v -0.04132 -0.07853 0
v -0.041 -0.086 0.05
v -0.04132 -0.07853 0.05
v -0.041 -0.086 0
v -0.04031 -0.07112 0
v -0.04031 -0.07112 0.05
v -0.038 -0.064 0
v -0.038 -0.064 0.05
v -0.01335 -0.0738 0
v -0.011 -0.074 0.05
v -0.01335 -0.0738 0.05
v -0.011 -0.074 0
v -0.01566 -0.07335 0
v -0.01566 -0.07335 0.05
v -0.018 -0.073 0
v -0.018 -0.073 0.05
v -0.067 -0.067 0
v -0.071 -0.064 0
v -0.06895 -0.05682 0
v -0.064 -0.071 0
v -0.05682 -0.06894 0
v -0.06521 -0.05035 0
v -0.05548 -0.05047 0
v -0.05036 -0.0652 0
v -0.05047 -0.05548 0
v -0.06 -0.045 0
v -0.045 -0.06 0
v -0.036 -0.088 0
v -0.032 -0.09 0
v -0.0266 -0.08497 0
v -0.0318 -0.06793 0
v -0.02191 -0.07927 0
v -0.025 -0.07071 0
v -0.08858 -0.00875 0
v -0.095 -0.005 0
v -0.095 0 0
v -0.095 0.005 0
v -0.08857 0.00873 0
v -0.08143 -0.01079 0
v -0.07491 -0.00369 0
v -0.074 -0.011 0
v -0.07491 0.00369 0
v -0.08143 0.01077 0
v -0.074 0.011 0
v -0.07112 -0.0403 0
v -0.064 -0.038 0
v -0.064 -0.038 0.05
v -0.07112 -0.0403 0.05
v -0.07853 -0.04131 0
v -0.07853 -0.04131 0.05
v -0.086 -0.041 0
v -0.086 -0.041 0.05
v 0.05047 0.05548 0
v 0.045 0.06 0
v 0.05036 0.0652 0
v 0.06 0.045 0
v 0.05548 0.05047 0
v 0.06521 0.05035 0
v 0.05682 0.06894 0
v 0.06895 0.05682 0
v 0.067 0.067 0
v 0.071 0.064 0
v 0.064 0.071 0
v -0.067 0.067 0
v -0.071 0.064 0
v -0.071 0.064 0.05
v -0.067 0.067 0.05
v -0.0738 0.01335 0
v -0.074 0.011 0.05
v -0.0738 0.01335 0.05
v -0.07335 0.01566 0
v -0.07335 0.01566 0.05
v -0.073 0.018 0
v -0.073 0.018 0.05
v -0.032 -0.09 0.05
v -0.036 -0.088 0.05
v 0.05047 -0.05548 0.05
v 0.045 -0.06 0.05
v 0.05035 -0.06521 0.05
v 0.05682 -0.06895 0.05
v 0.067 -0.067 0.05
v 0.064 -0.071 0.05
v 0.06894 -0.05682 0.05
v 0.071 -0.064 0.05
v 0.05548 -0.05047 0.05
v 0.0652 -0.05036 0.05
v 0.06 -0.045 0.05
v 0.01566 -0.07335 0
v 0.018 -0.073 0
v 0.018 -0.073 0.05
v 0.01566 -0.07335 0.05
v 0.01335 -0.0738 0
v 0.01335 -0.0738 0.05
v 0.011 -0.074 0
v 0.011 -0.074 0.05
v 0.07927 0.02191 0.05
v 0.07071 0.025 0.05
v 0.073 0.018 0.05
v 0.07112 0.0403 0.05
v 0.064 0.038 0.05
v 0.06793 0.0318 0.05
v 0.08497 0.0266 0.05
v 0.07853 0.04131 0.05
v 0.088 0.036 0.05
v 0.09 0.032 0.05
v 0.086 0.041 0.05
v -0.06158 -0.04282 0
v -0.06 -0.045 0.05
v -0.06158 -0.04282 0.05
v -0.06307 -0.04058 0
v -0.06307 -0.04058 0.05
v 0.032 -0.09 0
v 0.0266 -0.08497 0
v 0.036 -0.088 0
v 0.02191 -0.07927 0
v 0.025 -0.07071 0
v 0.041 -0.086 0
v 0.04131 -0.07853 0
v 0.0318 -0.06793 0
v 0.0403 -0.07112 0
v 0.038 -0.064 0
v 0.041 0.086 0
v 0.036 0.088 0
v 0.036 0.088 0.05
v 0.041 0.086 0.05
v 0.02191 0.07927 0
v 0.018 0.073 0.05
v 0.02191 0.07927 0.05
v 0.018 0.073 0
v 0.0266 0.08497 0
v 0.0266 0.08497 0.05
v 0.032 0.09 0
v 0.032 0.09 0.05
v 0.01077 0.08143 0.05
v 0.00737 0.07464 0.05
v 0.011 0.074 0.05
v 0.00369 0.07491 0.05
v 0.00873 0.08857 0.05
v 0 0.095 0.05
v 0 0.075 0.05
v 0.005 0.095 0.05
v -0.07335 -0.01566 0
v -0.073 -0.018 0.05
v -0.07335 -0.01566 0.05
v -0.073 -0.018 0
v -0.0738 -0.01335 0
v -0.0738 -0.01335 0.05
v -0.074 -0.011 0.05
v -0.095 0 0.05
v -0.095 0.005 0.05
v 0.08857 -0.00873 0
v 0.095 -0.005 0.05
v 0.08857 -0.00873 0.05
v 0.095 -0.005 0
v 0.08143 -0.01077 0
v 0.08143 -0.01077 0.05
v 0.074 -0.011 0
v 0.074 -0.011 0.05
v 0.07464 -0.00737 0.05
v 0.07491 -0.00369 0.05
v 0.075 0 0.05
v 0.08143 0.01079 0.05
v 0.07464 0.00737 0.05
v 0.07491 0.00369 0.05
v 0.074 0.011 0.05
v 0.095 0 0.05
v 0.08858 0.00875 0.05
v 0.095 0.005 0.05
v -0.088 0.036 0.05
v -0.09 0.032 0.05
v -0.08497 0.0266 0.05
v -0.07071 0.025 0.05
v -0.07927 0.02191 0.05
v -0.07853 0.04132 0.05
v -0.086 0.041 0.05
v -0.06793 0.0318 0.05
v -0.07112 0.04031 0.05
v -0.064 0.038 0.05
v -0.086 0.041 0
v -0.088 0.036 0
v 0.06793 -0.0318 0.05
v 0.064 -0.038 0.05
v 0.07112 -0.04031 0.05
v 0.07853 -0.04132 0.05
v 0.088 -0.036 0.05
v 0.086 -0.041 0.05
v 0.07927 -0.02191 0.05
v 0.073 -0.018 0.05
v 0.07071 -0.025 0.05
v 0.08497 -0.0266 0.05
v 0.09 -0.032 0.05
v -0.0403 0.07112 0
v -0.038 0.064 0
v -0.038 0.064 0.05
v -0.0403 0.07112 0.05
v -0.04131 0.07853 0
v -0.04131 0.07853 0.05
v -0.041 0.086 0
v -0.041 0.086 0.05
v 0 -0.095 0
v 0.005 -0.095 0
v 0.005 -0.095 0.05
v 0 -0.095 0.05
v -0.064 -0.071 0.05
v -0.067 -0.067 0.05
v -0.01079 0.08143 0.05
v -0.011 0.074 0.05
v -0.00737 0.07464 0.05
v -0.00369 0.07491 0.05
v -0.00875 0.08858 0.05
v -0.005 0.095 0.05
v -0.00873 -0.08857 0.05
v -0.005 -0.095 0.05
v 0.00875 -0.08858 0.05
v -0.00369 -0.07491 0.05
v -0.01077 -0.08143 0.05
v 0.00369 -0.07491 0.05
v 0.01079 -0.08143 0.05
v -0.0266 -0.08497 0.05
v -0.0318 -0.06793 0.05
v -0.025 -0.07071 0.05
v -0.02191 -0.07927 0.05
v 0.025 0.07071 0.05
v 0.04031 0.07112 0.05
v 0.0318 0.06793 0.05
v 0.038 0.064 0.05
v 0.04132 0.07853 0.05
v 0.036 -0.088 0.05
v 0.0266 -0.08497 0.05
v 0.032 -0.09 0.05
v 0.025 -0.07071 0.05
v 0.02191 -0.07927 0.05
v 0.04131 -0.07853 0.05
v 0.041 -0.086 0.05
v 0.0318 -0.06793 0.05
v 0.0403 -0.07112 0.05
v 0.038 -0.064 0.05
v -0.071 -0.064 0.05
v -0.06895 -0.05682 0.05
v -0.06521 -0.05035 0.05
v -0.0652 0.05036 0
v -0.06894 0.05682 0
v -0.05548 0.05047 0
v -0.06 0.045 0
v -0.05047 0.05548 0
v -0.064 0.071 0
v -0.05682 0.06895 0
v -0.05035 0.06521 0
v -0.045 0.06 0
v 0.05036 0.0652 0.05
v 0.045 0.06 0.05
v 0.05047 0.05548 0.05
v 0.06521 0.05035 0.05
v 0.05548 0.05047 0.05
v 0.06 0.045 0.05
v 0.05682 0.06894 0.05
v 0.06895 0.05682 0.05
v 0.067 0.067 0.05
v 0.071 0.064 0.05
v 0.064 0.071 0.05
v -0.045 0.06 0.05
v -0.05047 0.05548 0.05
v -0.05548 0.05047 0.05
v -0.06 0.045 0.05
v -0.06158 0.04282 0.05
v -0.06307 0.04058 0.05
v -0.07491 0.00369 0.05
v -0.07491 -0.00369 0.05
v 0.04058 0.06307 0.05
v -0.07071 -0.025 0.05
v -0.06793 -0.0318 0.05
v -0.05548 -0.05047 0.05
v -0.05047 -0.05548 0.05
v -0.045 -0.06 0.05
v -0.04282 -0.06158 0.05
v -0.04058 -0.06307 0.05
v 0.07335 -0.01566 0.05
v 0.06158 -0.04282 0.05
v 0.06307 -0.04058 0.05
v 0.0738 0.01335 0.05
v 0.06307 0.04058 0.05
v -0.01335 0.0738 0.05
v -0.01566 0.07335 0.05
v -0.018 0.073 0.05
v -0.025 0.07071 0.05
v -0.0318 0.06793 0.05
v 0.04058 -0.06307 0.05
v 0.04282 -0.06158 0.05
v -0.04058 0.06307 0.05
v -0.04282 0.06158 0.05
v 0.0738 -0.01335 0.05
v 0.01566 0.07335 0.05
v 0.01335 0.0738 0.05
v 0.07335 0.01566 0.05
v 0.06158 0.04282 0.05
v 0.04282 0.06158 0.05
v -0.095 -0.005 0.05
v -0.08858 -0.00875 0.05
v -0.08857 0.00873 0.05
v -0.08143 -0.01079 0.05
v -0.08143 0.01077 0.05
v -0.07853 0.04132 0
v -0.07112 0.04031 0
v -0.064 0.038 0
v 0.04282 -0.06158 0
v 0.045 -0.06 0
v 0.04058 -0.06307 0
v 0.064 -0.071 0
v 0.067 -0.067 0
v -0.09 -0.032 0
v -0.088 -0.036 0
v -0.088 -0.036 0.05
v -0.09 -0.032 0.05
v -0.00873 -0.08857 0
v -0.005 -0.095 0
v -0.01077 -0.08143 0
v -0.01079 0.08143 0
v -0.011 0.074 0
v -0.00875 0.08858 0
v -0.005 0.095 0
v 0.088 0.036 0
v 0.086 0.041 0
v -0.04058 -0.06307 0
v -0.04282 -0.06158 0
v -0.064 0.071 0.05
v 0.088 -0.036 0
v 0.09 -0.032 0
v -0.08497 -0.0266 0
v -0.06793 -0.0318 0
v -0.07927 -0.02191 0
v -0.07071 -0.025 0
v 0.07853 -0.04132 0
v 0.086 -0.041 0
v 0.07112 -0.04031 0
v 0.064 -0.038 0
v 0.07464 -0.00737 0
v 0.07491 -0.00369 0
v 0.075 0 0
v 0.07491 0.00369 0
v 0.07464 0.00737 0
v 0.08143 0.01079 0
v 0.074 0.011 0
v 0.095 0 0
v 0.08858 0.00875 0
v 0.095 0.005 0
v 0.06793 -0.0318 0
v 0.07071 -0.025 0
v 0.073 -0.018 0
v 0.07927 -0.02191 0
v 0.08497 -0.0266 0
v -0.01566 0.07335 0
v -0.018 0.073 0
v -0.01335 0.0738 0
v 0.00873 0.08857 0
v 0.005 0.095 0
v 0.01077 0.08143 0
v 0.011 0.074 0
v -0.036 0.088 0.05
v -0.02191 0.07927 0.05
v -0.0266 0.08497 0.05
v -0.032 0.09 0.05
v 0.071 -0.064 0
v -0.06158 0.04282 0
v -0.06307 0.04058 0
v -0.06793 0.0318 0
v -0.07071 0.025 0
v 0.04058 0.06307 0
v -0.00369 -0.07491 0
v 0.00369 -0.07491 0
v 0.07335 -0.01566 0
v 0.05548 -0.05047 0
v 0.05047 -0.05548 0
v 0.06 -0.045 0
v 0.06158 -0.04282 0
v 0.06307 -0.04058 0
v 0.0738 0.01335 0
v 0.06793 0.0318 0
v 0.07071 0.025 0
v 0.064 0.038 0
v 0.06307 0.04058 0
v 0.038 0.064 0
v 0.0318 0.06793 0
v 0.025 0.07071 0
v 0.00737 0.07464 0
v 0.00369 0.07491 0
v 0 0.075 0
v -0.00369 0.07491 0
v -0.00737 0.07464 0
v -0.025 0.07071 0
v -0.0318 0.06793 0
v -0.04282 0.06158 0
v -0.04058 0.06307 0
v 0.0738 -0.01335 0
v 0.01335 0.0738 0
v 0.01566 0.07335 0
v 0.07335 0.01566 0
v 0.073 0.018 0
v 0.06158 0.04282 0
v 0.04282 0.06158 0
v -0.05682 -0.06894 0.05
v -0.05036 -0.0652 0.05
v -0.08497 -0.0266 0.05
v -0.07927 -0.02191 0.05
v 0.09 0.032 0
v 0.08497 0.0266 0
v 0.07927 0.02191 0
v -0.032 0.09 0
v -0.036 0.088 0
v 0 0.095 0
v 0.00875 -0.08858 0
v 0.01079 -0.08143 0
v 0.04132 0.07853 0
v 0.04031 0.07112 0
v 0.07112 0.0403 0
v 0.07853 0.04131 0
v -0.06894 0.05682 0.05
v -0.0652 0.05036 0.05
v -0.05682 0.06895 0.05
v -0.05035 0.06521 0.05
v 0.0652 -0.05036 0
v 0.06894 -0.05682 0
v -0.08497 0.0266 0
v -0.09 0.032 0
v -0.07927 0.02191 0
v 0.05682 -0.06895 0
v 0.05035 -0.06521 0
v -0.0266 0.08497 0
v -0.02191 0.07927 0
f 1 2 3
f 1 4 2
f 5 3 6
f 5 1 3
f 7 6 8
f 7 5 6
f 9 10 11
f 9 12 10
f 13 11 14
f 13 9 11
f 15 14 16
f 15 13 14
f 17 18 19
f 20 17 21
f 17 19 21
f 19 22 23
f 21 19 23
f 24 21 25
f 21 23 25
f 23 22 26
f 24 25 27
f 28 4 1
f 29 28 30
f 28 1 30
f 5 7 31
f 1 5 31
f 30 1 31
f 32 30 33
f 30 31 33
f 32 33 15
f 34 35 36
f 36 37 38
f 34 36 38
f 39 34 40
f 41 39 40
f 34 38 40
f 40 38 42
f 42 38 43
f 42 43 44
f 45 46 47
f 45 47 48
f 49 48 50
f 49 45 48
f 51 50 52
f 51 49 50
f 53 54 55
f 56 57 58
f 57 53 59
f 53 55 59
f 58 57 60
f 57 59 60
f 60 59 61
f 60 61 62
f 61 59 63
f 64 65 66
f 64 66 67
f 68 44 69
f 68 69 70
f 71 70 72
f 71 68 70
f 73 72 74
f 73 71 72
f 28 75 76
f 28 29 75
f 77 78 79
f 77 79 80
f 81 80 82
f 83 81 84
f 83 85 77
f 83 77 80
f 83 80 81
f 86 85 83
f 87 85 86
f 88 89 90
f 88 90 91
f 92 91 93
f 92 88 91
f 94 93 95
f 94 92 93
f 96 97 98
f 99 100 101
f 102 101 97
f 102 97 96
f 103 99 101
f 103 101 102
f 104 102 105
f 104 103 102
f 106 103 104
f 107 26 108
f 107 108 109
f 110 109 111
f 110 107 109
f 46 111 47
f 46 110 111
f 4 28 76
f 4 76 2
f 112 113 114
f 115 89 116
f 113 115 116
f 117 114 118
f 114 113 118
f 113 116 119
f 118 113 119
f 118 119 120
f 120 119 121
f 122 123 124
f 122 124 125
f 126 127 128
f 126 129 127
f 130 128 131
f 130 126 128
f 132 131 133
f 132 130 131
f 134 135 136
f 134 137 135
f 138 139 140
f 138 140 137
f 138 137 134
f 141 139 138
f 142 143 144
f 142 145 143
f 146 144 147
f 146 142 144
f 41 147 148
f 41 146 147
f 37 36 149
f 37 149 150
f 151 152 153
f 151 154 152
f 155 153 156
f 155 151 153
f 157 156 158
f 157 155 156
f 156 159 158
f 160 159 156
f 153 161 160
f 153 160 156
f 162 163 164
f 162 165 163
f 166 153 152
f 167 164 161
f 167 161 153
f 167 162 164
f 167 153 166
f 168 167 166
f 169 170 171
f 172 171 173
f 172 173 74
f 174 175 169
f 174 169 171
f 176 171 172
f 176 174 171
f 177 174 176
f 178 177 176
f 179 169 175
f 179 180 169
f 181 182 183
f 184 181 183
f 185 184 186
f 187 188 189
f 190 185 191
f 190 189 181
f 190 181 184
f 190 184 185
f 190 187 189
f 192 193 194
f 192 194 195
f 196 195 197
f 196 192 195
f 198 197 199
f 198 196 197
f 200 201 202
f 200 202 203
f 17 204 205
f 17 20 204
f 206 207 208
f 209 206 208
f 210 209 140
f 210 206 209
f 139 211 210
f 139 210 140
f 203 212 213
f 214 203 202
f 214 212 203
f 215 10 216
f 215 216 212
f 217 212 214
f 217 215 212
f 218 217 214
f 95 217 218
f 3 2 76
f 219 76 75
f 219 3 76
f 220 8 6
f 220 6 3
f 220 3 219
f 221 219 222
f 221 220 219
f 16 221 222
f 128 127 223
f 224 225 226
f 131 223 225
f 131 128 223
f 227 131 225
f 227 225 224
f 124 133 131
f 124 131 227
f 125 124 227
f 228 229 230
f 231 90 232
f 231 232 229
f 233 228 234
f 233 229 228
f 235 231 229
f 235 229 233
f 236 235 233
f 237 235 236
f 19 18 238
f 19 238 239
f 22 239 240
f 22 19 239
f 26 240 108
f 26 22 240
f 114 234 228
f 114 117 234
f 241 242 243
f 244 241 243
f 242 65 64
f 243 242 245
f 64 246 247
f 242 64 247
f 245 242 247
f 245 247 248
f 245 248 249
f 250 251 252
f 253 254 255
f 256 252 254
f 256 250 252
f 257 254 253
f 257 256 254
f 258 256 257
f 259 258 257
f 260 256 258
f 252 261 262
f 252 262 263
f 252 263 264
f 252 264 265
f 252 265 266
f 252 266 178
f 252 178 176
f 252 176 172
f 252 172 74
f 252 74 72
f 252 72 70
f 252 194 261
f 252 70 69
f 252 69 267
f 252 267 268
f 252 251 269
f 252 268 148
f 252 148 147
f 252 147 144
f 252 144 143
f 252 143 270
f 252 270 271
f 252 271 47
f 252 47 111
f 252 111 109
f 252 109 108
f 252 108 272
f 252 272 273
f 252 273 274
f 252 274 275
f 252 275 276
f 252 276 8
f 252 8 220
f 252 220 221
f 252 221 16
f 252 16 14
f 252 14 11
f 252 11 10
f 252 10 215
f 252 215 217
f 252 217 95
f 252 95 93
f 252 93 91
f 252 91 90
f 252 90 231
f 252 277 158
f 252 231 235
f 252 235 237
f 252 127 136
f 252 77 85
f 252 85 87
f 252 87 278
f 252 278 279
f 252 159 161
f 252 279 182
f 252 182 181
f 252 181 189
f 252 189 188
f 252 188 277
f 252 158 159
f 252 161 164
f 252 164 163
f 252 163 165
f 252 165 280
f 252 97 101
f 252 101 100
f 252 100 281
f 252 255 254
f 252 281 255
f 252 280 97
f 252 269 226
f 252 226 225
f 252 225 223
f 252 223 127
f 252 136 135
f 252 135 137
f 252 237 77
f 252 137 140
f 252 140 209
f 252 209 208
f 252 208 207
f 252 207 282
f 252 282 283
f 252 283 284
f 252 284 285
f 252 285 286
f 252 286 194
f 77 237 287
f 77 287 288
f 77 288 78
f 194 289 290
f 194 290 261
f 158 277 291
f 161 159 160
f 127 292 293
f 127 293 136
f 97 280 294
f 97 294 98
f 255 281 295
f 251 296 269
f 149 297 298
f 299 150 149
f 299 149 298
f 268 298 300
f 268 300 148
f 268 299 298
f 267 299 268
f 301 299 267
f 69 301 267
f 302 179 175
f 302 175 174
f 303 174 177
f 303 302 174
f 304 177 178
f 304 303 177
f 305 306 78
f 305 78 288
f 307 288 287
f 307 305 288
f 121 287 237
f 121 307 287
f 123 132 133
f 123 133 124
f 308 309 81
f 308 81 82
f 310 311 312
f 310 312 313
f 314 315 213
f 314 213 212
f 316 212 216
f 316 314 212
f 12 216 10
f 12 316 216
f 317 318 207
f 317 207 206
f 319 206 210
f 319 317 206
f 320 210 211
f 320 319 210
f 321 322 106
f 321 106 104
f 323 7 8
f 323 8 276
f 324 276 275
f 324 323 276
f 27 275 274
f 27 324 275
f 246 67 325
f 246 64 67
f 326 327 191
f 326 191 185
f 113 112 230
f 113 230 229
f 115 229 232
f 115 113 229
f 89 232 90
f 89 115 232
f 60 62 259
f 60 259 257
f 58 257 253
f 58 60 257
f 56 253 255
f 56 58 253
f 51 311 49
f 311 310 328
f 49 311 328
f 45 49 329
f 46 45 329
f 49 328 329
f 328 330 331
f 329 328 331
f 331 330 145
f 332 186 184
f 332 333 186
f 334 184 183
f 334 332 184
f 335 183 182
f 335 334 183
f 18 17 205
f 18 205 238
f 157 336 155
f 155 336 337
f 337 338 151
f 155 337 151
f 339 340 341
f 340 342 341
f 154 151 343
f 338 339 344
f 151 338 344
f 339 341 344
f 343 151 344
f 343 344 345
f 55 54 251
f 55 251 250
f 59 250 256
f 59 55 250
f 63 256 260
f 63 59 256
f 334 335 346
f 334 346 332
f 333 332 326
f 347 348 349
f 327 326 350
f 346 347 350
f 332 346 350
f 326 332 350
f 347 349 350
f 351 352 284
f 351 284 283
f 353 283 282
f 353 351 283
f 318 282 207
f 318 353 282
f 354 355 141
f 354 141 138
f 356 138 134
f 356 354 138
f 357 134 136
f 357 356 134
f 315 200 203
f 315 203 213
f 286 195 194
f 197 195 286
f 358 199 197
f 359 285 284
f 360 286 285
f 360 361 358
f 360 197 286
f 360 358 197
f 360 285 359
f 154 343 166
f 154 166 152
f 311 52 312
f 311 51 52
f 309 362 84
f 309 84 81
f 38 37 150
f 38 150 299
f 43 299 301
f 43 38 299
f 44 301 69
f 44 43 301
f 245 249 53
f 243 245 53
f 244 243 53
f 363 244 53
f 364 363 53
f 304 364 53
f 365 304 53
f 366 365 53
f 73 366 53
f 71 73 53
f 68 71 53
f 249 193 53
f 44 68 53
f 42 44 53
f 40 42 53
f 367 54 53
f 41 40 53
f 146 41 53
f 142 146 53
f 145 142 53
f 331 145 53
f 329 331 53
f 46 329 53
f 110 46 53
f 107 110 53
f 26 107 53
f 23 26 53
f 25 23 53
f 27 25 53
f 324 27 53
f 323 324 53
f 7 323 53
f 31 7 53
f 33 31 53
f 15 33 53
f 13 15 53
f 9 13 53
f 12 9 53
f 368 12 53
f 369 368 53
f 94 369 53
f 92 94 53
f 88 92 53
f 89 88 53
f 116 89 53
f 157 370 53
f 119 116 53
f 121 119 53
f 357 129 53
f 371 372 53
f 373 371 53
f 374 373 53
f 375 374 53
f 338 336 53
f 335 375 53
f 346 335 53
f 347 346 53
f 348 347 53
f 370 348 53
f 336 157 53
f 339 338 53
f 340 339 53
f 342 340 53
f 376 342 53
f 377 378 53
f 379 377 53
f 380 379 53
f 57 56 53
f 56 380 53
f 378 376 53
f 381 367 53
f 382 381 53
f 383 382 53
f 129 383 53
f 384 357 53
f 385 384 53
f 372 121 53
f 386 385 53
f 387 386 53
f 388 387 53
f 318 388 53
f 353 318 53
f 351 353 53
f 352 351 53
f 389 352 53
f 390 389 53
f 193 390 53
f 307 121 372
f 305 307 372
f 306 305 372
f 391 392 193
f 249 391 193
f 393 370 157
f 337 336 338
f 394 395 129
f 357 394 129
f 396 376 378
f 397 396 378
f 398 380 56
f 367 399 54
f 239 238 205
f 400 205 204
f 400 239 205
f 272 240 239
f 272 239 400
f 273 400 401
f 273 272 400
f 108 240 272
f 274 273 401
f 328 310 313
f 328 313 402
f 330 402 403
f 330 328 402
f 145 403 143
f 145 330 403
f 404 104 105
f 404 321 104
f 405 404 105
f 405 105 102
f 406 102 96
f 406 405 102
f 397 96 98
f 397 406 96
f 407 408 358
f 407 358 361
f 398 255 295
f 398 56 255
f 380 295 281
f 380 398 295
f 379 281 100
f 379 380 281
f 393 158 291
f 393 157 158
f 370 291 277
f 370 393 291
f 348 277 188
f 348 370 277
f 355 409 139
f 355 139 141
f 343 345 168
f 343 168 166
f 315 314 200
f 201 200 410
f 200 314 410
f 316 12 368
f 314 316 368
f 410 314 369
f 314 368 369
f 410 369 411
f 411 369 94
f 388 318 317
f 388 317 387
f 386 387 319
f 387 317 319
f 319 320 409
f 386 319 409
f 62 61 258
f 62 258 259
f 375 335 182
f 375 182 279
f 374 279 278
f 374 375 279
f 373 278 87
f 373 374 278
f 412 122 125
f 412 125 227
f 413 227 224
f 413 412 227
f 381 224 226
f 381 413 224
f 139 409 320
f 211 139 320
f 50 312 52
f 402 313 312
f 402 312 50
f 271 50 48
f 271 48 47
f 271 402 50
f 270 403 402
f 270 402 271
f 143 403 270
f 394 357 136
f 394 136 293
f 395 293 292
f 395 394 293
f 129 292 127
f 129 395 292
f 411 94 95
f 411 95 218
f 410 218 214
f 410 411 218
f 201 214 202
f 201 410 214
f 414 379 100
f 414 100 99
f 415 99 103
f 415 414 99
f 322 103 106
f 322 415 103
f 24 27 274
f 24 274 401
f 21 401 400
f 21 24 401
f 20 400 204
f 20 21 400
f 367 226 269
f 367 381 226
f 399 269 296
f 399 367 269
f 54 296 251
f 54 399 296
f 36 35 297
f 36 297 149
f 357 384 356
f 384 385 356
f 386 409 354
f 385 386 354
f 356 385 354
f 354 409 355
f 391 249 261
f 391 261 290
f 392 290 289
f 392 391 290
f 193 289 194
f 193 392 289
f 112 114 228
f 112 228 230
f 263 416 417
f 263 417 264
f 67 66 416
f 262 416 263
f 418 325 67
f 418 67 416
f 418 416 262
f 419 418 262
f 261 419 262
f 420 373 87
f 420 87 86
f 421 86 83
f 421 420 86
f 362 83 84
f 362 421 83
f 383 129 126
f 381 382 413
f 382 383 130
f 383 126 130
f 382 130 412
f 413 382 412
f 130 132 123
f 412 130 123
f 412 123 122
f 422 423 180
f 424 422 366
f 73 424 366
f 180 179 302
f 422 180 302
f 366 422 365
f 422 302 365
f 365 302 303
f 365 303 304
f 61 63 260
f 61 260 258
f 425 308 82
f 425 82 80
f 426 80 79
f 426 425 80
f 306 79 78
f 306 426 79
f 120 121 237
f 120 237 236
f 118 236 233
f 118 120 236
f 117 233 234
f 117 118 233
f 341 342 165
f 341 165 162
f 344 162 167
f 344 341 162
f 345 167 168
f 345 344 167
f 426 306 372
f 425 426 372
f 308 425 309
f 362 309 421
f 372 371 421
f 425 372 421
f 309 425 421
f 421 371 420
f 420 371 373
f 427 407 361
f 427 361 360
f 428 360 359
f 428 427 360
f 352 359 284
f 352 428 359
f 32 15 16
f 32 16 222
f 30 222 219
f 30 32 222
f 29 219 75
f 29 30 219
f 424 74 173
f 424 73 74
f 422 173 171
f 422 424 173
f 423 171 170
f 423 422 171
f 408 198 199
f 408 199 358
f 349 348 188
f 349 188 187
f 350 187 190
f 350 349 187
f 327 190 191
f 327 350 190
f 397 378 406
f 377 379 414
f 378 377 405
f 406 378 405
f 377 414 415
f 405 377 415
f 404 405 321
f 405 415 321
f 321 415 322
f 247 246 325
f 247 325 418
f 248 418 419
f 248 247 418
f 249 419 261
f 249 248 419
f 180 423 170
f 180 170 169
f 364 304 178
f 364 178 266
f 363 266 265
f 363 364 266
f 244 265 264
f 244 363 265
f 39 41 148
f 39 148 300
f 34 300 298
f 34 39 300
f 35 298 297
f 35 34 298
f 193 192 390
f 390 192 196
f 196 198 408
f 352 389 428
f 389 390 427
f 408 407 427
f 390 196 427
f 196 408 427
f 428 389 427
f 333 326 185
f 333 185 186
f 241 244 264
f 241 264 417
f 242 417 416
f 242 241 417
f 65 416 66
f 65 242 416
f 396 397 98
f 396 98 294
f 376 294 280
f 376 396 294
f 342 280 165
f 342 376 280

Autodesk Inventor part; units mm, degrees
ref_plane "YZ Plane" through (0, 0, 0) normal (1, 0, 0) x (0, 1, 0)
ref_plane "XZ Plane" through (0, 0, 0) normal (0, 1, 0) x (-1, 0, 0)
ref_plane "Work Plane1" through (0, 0, 0) normal (0, 0, 1) x (1, 0, 0)
sketch "Sketch1" plane through (0, 0, 0) normal (0, 0, 1) x (1, 0, 0)
  circle A0 centre (0, 0) radius 0.075
  arc A1 (-0.011, -0.074) -> (0.011, -0.074) centre (0, -0.014) ccw
  arc A2 (-0.011, -0.074) -> (-0.005, -0.095) centre (0.0188, -0.0768) ccw
  line L0 (0, -0.095) -> (-0.005, -0.095)
  line L1 (0.005, -0.095) -> (0, -0.095)
  arc A3 (0.005, -0.095) -> (0.011, -0.074) centre (-0.0188, -0.0768) ccw
  arc A4 (0.018, -0.073) -> (0.038, -0.064) centre (-0.0002, -0.0059) ccw
  arc A5 (0.018, -0.073) -> (0.032, -0.09) centre (0.0675, -0.0465) ccw
  line L2 (0.036, -0.088) -> (0.032, -0.09)
  line L3 (0.041, -0.086) -> (0.036, -0.088)
  arc A6 (0.041, -0.086) -> (0.038, -0.064) centre (-0.0008, -0.0805) ccw
  arc A7 (0.064, -0.038) -> (0.073, -0.018) centre (0.0059, 0.0002) ccw
  arc A8 (0.064, -0.038) -> (0.086, -0.041) centre (0.0805, 0.0008) ccw
  line L4 (0.088, -0.036) -> (0.086, -0.041)
  line L5 (0.09, -0.032) -> (0.088, -0.036)
  arc A9 (0.09, -0.032) -> (0.073, -0.018) centre (0.0465, -0.0675) ccw
  arc A10 (0.074, -0.011) -> (0.074, 0.011) centre (0.014, 0) ccw
  arc A11 (0.074, -0.011) -> (0.095, -0.005) centre (0.0768, 0.0188) ccw
  line L6 (0.095, 0) -> (0.095, -0.005)
  line L7 (0.095, 0.005) -> (0.095, 0)
  arc A12 (0.095, 0.005) -> (0.074, 0.011) centre (0.0768, -0.0188) ccw
  arc A13 (0.045, -0.06) -> (0.06, -0.045) centre (-0.0035, 0.0035) ccw
  arc A14 (0.045, -0.06) -> (0.064, -0.071) centre (0.0687, -0.041) ccw
  line L8 (0.067, -0.067) -> (0.064, -0.071)
  line L9 (0.071, -0.064) -> (0.067, -0.067)
  arc A15 (0.071, -0.064) -> (0.06, -0.045) centre (0.041, -0.0687) ccw
  arc A16 (0.073, 0.018) -> (0.064, 0.038) centre (0.0059, -0.0002) ccw
  arc A17 (0.073, 0.018) -> (0.09, 0.032) centre (0.0465, 0.0675) ccw
  line L10 (0.088, 0.036) -> (0.09, 0.032)
  line L11 (0.086, 0.041) -> (0.088, 0.036)
  arc A18 (0.086, 0.041) -> (0.064, 0.038) centre (0.0805, -0.0008) ccw
  arc A19 (0.06, 0.045) -> (0.045, 0.06) centre (-0.0035, -0.0035) ccw
  arc A20 (0.06, 0.045) -> (0.071, 0.064) centre (0.041, 0.0687) ccw
  line L12 (0.067, 0.067) -> (0.071, 0.064)
  line L13 (0.064, 0.071) -> (0.067, 0.067)
  arc A21 (0.064, 0.071) -> (0.045, 0.06) centre (0.0687, 0.041) ccw
  arc A22 (0.038, 0.064) -> (0.018, 0.073) centre (-0.0002, 0.0059) ccw
  arc A23 (0.038, 0.064) -> (0.041, 0.086) centre (-0.0008, 0.0805) ccw
  line L14 (0.036, 0.088) -> (0.041, 0.086)
  line L15 (0.032, 0.09) -> (0.036, 0.088)
  arc A24 (0.032, 0.09) -> (0.018, 0.073) centre (0.0675, 0.0465) ccw
  arc A25 (-0.038, -0.064) -> (-0.018, -0.073) centre (0.0002, -0.0059) ccw
  arc A26 (-0.038, -0.064) -> (-0.041, -0.086) centre (0.0008, -0.0805) ccw
  line L16 (-0.036, -0.088) -> (-0.041, -0.086)
  line L17 (-0.032, -0.09) -> (-0.036, -0.088)
  arc A27 (-0.032, -0.09) -> (-0.018, -0.073) centre (-0.0675, -0.0465) ccw
  arc A28 (-0.06, -0.045) -> (-0.045, -0.06) centre (0.0035, 0.0035) ccw
  arc A29 (-0.06, -0.045) -> (-0.071, -0.064) centre (-0.041, -0.0687) ccw
  line L18 (-0.067, -0.067) -> (-0.071, -0.064)
  line L19 (-0.064, -0.071) -> (-0.067, -0.067)
  arc A30 (-0.064, -0.071) -> (-0.045, -0.06) centre (-0.0687, -0.041) ccw
  arc A31 (-0.073, -0.018) -> (-0.064, -0.038) centre (-0.0059, 0.0002) ccw
  arc A32 (-0.073, -0.018) -> (-0.09, -0.032) centre (-0.0465, -0.0675) ccw
  line L20 (-0.088, -0.036) -> (-0.09, -0.032)
  line L21 (-0.086, -0.041) -> (-0.088, -0.036)
  arc A33 (-0.086, -0.041) -> (-0.064, -0.038) centre (-0.0805, 0.0008) ccw
  arc A34 (-0.074, 0.011) -> (-0.074, -0.011) centre (-0.014, 0) ccw
  arc A35 (-0.074, 0.011) -> (-0.095, 0.005) centre (-0.0768, -0.0188) ccw
  line L22 (-0.095, 0) -> (-0.095, 0.005)
  line L23 (-0.095, -0.005) -> (-0.095, 0)
  arc A36 (-0.095, -0.005) -> (-0.074, -0.011) centre (-0.0768, 0.0188) ccw
  arc A37 (-0.064, 0.038) -> (-0.073, 0.018) centre (-0.0059, -0.0002) ccw
  arc A38 (-0.064, 0.038) -> (-0.086, 0.041) centre (-0.0805, -0.0008) ccw
  line L24 (-0.088, 0.036) -> (-0.086, 0.041)
  line L25 (-0.09, 0.032) -> (-0.088, 0.036)
  arc A39 (-0.09, 0.032) -> (-0.073, 0.018) centre (-0.0465, 0.0675) ccw
  arc A40 (-0.045, 0.06) -> (-0.06, 0.045) centre (0.0035, -0.0035) ccw
  arc A41 (-0.045, 0.06) -> (-0.064, 0.071) centre (-0.0687, 0.041) ccw
  line L26 (-0.067, 0.067) -> (-0.064, 0.071)
  line L27 (-0.071, 0.064) -> (-0.067, 0.067)
  arc A42 (-0.071, 0.064) -> (-0.06, 0.045) centre (-0.041, 0.0687) ccw
  arc A43 (-0.018, 0.073) -> (-0.038, 0.064) centre (0.0002, 0.0059) ccw
  arc A44 (-0.018, 0.073) -> (-0.032, 0.09) centre (-0.0675, 0.0465) ccw
  line L28 (-0.036, 0.088) -> (-0.032, 0.09)
  line L29 (-0.041, 0.086) -> (-0.036, 0.088)
  arc A45 (-0.041, 0.086) -> (-0.038, 0.064) centre (0.0008, 0.0805) ccw
  arc A46 (0, 0.075) -> (-0.011, 0.074) centre (-0.0025, 0.0415) ccw
  arc A47 (-0.005, 0.095) -> (-0.011, 0.074) centre (0.0188, 0.0768) ccw
  line L30 (0, 0.095) -> (-0.005, 0.095)
  line L31 (0, 0.075) -> (0, 0.095)
  arc A48 (0.011, 0.074) -> (0, 0.075) centre (0.0025, 0.0415) ccw
  arc A49 (0.011, 0.074) -> (0.005, 0.095) centre (-0.0188, 0.0768) ccw
  line L32 (0, 0.095) -> (0.005, 0.095)
  line L33 (0, 0.075) -> (0, 0.095)
extrude "Extrusion1" add sketch "Sketch1" along normal blind 0.05
properties part number "test_gear_cad_model"
